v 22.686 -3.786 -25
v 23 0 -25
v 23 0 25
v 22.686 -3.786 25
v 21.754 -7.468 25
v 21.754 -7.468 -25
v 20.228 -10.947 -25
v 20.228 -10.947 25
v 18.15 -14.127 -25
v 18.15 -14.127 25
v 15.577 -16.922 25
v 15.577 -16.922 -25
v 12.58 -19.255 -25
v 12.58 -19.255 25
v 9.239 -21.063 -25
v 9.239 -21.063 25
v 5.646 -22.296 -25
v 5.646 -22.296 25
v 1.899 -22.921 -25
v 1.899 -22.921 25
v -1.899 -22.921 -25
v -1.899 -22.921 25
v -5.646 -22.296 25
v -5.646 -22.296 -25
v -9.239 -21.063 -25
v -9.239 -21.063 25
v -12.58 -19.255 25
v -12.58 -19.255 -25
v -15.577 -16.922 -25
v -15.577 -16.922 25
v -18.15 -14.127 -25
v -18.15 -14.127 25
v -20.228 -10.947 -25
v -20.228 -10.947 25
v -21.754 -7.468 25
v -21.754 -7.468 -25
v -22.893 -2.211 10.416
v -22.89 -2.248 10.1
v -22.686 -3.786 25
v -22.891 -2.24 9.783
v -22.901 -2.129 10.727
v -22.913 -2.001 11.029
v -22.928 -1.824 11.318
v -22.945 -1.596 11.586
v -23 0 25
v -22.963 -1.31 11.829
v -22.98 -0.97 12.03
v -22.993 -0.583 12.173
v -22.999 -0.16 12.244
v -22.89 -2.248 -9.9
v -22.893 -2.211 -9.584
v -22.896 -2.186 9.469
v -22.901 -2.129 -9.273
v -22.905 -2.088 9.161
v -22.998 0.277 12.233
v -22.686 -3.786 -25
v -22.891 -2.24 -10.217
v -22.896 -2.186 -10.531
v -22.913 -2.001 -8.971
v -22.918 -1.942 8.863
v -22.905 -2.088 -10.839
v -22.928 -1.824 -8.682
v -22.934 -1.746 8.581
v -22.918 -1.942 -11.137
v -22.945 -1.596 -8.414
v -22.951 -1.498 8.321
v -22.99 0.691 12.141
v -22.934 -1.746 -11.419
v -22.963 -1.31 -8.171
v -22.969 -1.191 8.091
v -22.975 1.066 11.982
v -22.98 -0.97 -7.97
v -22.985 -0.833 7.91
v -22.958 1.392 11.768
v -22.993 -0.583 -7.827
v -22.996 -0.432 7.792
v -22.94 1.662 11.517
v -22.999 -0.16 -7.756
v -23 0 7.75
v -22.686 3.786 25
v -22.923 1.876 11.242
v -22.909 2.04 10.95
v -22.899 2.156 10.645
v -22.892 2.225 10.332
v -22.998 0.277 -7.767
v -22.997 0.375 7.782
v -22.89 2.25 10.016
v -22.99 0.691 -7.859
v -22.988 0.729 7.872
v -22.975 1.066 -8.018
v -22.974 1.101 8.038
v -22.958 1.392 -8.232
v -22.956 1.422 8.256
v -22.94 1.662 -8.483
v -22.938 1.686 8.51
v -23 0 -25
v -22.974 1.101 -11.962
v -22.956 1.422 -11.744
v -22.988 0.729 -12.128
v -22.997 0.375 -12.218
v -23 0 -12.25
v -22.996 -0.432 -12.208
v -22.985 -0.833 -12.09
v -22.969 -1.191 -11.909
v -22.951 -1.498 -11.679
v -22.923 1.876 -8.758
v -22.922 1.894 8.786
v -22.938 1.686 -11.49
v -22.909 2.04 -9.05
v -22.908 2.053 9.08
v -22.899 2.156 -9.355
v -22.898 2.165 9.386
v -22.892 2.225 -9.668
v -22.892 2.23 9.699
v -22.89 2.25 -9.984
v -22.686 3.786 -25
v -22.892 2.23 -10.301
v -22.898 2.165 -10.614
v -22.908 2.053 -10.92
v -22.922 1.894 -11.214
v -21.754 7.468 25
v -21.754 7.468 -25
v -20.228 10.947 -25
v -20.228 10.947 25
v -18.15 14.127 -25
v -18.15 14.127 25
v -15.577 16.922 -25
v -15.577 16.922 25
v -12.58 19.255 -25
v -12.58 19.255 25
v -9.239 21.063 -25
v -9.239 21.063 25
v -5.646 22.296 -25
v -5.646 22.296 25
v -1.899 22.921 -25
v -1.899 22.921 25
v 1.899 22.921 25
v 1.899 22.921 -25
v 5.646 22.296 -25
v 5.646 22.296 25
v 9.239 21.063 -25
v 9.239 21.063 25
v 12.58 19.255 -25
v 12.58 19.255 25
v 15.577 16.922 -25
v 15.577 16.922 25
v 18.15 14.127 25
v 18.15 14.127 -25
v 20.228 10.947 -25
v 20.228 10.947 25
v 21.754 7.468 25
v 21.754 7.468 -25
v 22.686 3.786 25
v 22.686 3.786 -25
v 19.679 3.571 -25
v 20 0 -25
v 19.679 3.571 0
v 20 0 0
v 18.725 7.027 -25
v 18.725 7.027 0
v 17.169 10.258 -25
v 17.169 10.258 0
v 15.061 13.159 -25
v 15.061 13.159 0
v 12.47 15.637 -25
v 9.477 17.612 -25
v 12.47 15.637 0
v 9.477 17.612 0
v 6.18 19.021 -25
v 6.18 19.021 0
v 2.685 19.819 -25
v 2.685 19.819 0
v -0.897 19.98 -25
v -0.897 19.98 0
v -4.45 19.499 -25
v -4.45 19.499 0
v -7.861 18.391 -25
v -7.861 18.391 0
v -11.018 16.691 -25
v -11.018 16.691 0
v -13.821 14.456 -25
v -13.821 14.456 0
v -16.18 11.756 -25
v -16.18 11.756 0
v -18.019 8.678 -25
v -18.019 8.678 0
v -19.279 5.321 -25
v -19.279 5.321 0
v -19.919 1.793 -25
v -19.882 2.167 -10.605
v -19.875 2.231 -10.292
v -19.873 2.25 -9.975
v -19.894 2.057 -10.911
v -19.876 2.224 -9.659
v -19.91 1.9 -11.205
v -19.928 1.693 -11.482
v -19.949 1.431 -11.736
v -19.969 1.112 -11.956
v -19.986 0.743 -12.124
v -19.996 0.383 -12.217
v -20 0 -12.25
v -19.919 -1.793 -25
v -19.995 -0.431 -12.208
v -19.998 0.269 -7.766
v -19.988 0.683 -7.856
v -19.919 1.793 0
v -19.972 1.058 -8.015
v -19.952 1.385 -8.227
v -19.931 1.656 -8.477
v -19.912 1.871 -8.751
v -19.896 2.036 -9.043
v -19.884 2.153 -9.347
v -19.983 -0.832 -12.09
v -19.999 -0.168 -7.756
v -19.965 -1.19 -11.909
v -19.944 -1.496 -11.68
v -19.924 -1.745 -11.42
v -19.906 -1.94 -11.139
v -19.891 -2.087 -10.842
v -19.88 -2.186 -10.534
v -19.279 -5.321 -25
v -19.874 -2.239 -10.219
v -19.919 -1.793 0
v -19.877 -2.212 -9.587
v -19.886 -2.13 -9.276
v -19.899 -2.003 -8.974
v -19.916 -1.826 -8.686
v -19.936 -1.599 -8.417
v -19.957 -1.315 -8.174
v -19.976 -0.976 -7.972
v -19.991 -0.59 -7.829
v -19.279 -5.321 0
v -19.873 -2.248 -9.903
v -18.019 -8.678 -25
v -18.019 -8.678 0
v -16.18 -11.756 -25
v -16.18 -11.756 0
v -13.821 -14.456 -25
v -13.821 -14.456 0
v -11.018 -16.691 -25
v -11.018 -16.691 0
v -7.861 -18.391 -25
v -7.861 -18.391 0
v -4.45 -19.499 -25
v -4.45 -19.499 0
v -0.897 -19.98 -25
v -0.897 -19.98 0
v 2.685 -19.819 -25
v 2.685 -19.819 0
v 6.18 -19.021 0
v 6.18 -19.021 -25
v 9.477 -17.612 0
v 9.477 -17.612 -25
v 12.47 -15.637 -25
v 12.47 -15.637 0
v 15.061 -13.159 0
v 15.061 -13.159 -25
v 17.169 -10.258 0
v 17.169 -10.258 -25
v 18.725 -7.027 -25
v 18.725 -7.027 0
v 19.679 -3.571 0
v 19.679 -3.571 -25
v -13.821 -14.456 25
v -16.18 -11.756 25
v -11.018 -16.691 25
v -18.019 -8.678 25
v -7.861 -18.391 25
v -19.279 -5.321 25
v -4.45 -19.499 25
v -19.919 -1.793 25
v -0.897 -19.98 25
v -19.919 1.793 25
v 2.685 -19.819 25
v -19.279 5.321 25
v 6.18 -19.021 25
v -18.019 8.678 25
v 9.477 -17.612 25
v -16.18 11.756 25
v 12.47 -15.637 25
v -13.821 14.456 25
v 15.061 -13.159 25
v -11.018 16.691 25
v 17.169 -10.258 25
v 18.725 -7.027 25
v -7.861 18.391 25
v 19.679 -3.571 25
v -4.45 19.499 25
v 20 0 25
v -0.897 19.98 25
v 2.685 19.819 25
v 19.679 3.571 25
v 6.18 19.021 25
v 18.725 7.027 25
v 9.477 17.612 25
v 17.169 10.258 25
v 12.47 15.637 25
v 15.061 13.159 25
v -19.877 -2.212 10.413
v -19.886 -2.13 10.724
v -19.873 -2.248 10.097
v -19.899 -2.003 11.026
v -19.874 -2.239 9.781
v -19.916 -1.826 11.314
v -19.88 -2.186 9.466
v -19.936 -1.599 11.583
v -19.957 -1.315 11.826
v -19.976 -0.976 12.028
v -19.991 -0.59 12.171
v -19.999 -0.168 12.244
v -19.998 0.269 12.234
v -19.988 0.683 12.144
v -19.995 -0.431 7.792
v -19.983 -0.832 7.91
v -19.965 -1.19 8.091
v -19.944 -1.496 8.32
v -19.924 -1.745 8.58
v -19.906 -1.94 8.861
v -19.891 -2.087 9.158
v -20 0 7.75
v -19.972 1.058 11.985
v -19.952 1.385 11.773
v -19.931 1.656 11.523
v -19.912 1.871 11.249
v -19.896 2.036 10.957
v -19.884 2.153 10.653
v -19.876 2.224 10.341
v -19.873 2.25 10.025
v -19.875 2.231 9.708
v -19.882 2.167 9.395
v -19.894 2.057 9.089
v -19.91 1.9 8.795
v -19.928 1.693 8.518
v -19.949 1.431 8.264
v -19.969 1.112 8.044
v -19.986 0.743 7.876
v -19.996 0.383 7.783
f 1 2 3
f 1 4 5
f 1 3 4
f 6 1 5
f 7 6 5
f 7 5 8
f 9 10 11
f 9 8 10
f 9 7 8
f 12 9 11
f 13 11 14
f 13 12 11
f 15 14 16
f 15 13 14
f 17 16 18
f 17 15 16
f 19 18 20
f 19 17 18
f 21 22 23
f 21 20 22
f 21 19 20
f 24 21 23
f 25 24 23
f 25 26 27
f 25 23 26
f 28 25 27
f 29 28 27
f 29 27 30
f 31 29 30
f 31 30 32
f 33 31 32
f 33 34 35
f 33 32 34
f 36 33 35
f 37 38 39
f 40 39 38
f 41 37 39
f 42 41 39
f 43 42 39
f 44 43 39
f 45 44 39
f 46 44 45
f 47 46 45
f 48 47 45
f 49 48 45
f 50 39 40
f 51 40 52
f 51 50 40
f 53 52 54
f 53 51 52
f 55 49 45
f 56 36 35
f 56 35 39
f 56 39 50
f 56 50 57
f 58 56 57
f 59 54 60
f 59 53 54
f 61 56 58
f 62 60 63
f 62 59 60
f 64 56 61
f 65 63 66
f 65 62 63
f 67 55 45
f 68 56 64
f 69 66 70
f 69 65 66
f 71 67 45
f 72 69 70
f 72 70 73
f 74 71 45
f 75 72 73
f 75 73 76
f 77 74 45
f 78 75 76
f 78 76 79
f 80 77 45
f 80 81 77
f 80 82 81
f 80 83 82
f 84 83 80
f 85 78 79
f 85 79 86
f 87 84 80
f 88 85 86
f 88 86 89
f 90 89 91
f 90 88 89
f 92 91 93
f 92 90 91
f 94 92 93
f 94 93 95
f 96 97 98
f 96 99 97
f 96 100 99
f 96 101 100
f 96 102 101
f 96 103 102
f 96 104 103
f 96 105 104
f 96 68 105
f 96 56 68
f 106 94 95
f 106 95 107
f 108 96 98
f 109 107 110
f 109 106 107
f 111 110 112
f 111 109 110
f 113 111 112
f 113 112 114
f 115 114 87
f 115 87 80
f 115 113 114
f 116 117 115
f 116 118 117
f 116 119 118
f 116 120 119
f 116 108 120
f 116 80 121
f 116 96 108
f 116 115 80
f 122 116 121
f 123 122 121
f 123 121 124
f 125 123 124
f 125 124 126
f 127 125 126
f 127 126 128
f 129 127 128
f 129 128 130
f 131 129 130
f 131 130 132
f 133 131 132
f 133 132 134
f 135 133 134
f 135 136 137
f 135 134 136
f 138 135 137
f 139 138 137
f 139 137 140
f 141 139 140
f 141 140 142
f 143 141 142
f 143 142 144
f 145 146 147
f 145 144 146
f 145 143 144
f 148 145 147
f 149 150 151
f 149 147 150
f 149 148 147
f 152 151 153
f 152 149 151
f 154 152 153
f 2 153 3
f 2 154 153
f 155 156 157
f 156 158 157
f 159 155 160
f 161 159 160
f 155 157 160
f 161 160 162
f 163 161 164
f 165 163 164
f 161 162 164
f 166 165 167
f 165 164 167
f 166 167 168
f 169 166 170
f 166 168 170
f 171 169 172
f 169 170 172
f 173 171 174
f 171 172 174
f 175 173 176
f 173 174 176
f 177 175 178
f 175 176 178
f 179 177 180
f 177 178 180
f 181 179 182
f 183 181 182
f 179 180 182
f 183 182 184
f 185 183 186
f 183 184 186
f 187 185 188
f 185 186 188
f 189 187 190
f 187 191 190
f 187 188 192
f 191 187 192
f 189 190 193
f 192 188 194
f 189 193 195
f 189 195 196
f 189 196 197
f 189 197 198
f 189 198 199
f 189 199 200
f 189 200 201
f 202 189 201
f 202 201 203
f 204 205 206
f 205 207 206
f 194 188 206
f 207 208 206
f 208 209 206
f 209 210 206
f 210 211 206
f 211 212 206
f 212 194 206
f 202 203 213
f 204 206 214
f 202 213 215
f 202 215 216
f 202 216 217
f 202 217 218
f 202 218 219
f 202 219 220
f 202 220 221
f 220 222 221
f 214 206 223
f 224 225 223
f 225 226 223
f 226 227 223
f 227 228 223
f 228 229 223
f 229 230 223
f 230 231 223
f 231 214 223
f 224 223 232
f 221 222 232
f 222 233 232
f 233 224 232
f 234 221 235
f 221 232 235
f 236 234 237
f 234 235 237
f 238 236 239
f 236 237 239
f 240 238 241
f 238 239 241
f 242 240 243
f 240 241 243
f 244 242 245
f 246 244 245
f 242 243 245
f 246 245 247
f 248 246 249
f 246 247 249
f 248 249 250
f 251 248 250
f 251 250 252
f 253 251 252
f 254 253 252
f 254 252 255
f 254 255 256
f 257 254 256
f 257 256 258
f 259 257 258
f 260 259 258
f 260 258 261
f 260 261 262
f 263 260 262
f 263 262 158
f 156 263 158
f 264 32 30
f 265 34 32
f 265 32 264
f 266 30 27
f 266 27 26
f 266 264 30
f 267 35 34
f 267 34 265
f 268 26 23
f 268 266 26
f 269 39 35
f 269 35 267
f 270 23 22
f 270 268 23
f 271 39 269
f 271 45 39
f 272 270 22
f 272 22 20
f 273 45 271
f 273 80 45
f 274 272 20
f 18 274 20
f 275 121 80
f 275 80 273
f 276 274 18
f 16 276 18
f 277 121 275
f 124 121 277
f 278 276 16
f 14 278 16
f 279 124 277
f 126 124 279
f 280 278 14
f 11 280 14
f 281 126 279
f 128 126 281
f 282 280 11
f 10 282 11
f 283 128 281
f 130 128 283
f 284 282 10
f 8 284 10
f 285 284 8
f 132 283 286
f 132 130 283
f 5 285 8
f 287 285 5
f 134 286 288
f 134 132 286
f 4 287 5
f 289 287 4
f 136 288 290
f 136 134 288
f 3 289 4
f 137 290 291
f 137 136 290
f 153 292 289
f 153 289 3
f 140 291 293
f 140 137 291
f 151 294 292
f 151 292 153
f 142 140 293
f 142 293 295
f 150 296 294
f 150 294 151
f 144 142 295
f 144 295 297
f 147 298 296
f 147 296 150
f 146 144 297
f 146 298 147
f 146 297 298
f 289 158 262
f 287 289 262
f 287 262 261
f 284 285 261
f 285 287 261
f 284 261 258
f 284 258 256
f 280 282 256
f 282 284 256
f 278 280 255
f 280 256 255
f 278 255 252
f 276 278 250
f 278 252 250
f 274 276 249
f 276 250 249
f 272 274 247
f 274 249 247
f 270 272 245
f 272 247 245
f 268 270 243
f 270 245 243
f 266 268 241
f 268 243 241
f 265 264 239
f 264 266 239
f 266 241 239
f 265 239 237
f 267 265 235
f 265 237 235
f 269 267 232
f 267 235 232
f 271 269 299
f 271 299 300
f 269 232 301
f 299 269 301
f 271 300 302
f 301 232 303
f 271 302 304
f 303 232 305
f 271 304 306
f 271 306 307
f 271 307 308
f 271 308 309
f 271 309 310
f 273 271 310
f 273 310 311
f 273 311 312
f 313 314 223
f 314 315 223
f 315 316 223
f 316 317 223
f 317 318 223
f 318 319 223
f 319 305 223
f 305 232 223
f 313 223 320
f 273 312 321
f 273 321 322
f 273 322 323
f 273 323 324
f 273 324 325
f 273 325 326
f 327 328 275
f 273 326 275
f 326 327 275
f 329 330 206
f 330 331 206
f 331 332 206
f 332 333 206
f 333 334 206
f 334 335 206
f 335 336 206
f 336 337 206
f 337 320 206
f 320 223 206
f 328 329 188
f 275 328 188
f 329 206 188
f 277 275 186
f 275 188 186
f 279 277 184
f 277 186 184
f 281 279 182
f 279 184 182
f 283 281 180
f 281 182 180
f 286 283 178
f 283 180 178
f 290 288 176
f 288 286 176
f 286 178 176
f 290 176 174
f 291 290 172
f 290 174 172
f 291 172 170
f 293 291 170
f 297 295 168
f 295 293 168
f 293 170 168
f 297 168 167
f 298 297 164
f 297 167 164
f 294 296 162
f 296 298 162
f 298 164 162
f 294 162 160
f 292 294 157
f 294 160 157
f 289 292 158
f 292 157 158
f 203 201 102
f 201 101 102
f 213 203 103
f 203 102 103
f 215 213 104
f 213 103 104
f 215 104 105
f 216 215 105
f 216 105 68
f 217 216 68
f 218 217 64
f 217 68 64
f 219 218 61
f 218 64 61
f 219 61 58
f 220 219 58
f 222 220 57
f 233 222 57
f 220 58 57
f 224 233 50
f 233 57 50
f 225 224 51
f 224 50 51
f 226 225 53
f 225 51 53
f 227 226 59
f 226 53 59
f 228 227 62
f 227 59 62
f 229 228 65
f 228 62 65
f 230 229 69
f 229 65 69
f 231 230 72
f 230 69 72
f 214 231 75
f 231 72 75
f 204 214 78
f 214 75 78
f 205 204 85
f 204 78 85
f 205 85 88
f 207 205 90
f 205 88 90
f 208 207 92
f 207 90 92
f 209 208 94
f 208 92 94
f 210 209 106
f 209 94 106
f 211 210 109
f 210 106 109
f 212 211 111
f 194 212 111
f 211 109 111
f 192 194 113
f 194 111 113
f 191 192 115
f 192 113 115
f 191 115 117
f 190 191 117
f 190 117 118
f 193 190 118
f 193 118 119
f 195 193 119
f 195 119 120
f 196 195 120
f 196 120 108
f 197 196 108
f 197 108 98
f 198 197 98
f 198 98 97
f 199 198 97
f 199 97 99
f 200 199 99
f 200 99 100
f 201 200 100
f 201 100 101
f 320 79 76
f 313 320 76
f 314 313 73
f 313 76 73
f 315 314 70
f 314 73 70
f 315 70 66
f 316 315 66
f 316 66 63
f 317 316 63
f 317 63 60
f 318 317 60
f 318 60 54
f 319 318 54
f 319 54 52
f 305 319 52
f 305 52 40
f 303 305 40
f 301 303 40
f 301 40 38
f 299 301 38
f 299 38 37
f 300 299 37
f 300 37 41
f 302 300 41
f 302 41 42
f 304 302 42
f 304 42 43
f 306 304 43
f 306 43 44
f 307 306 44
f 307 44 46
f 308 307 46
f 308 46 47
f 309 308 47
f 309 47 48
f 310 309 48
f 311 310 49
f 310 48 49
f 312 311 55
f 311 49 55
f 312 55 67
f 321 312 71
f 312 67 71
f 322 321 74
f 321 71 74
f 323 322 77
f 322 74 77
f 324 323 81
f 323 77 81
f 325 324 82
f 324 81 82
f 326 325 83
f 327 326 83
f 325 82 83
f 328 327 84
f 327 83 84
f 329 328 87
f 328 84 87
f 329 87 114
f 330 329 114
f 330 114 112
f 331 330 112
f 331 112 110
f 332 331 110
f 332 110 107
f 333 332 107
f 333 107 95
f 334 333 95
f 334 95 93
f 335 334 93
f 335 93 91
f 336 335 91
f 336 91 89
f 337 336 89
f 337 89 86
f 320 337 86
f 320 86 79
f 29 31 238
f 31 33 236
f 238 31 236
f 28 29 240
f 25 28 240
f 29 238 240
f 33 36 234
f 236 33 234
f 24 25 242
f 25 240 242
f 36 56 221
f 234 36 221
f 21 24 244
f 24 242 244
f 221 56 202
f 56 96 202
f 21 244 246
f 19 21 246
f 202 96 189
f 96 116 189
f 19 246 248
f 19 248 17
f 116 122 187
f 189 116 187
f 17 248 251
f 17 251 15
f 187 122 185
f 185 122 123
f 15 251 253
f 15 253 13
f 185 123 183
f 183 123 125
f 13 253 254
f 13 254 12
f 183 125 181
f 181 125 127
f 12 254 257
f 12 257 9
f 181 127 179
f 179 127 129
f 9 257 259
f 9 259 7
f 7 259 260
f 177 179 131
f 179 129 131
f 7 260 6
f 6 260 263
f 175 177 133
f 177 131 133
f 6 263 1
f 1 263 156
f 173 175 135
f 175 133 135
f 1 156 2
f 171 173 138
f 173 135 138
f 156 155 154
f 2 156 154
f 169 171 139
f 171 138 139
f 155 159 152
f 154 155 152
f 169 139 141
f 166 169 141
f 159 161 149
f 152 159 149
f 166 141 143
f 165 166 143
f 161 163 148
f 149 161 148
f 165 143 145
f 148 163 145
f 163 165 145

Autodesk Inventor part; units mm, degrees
ref_plane "YZ Plane" through (0, 0, 0) normal (1, 0, 0) x (0, 1, 0)
ref_plane "XZ Plane" through (0, 0, 0) normal (0, 1, 0) x (-1, 0, 0)
ref_plane "XY Plane" through (0, 0, 0) normal (0, 0, 1) x (1, 0, 0)
sketch "Sketch1" plane through (0, 0, 0) normal (0, 0, 1) x (1, 0, 0)
  circle A0 centre (0, 0) radius 20
  circle A1 centre (0, 0) radius 23
  dimension "d0" = 40
  dimension "d1" = 46
extrude "Extrusion1" add sketch "Sketch1" along normal mid plane 50
sketch "Sketch2" plane through (0, 0, 0) normal (1, 0, 0) x (0, 1, 0)
  line L0 (0, 105) -> (0, -105) projected
  line L1 (-105, 0) -> (105, 0) projected
  line L2 (23, 25) -> (-23, 25) projected
  line L3 (-23, -25) -> (23, -25) projected
  point P0 (0, 0)
  point P1 (0, 10)
  point P2 (0, -10)
  point P3 (0, -25)
  dimension "d21" = 20
  dimension "d22" = 15
hole "Hole1" at (0, 0, 10) at (0, 0, -10) direction (-1, 0, 0) diameter 4.5 end through all clearance for "Flat Head Machine Screw" size "M4" standard "Ansi Metric M Profile"
sketch "Sketch3" plane through (0, 0, 0) normal (1, 0, 0) x (0, 1, 0)
  line L0 (23, -25) -> (7, -25)
  line L1 (7, -25) -> (7, 25)
  line L2 (7, 25) -> (23, 25)
  line L3 (23, 25) -> (23, -25)
  line L4 (23, 25) -> (-23, 25) projected
  line L5 (-23, -25) -> (23, -25) projected
  line L6 (0, 195.3) -> (0, -195.3) projected
  point P0 (0, 0)
  dimension "d13" = 0
  dimension "d14" = 0
  dimension "d15" = 7
extrude "Extrusion2" [suppressed]
properties part number "Top_Separator Pipe" material "PVC-Piping"
